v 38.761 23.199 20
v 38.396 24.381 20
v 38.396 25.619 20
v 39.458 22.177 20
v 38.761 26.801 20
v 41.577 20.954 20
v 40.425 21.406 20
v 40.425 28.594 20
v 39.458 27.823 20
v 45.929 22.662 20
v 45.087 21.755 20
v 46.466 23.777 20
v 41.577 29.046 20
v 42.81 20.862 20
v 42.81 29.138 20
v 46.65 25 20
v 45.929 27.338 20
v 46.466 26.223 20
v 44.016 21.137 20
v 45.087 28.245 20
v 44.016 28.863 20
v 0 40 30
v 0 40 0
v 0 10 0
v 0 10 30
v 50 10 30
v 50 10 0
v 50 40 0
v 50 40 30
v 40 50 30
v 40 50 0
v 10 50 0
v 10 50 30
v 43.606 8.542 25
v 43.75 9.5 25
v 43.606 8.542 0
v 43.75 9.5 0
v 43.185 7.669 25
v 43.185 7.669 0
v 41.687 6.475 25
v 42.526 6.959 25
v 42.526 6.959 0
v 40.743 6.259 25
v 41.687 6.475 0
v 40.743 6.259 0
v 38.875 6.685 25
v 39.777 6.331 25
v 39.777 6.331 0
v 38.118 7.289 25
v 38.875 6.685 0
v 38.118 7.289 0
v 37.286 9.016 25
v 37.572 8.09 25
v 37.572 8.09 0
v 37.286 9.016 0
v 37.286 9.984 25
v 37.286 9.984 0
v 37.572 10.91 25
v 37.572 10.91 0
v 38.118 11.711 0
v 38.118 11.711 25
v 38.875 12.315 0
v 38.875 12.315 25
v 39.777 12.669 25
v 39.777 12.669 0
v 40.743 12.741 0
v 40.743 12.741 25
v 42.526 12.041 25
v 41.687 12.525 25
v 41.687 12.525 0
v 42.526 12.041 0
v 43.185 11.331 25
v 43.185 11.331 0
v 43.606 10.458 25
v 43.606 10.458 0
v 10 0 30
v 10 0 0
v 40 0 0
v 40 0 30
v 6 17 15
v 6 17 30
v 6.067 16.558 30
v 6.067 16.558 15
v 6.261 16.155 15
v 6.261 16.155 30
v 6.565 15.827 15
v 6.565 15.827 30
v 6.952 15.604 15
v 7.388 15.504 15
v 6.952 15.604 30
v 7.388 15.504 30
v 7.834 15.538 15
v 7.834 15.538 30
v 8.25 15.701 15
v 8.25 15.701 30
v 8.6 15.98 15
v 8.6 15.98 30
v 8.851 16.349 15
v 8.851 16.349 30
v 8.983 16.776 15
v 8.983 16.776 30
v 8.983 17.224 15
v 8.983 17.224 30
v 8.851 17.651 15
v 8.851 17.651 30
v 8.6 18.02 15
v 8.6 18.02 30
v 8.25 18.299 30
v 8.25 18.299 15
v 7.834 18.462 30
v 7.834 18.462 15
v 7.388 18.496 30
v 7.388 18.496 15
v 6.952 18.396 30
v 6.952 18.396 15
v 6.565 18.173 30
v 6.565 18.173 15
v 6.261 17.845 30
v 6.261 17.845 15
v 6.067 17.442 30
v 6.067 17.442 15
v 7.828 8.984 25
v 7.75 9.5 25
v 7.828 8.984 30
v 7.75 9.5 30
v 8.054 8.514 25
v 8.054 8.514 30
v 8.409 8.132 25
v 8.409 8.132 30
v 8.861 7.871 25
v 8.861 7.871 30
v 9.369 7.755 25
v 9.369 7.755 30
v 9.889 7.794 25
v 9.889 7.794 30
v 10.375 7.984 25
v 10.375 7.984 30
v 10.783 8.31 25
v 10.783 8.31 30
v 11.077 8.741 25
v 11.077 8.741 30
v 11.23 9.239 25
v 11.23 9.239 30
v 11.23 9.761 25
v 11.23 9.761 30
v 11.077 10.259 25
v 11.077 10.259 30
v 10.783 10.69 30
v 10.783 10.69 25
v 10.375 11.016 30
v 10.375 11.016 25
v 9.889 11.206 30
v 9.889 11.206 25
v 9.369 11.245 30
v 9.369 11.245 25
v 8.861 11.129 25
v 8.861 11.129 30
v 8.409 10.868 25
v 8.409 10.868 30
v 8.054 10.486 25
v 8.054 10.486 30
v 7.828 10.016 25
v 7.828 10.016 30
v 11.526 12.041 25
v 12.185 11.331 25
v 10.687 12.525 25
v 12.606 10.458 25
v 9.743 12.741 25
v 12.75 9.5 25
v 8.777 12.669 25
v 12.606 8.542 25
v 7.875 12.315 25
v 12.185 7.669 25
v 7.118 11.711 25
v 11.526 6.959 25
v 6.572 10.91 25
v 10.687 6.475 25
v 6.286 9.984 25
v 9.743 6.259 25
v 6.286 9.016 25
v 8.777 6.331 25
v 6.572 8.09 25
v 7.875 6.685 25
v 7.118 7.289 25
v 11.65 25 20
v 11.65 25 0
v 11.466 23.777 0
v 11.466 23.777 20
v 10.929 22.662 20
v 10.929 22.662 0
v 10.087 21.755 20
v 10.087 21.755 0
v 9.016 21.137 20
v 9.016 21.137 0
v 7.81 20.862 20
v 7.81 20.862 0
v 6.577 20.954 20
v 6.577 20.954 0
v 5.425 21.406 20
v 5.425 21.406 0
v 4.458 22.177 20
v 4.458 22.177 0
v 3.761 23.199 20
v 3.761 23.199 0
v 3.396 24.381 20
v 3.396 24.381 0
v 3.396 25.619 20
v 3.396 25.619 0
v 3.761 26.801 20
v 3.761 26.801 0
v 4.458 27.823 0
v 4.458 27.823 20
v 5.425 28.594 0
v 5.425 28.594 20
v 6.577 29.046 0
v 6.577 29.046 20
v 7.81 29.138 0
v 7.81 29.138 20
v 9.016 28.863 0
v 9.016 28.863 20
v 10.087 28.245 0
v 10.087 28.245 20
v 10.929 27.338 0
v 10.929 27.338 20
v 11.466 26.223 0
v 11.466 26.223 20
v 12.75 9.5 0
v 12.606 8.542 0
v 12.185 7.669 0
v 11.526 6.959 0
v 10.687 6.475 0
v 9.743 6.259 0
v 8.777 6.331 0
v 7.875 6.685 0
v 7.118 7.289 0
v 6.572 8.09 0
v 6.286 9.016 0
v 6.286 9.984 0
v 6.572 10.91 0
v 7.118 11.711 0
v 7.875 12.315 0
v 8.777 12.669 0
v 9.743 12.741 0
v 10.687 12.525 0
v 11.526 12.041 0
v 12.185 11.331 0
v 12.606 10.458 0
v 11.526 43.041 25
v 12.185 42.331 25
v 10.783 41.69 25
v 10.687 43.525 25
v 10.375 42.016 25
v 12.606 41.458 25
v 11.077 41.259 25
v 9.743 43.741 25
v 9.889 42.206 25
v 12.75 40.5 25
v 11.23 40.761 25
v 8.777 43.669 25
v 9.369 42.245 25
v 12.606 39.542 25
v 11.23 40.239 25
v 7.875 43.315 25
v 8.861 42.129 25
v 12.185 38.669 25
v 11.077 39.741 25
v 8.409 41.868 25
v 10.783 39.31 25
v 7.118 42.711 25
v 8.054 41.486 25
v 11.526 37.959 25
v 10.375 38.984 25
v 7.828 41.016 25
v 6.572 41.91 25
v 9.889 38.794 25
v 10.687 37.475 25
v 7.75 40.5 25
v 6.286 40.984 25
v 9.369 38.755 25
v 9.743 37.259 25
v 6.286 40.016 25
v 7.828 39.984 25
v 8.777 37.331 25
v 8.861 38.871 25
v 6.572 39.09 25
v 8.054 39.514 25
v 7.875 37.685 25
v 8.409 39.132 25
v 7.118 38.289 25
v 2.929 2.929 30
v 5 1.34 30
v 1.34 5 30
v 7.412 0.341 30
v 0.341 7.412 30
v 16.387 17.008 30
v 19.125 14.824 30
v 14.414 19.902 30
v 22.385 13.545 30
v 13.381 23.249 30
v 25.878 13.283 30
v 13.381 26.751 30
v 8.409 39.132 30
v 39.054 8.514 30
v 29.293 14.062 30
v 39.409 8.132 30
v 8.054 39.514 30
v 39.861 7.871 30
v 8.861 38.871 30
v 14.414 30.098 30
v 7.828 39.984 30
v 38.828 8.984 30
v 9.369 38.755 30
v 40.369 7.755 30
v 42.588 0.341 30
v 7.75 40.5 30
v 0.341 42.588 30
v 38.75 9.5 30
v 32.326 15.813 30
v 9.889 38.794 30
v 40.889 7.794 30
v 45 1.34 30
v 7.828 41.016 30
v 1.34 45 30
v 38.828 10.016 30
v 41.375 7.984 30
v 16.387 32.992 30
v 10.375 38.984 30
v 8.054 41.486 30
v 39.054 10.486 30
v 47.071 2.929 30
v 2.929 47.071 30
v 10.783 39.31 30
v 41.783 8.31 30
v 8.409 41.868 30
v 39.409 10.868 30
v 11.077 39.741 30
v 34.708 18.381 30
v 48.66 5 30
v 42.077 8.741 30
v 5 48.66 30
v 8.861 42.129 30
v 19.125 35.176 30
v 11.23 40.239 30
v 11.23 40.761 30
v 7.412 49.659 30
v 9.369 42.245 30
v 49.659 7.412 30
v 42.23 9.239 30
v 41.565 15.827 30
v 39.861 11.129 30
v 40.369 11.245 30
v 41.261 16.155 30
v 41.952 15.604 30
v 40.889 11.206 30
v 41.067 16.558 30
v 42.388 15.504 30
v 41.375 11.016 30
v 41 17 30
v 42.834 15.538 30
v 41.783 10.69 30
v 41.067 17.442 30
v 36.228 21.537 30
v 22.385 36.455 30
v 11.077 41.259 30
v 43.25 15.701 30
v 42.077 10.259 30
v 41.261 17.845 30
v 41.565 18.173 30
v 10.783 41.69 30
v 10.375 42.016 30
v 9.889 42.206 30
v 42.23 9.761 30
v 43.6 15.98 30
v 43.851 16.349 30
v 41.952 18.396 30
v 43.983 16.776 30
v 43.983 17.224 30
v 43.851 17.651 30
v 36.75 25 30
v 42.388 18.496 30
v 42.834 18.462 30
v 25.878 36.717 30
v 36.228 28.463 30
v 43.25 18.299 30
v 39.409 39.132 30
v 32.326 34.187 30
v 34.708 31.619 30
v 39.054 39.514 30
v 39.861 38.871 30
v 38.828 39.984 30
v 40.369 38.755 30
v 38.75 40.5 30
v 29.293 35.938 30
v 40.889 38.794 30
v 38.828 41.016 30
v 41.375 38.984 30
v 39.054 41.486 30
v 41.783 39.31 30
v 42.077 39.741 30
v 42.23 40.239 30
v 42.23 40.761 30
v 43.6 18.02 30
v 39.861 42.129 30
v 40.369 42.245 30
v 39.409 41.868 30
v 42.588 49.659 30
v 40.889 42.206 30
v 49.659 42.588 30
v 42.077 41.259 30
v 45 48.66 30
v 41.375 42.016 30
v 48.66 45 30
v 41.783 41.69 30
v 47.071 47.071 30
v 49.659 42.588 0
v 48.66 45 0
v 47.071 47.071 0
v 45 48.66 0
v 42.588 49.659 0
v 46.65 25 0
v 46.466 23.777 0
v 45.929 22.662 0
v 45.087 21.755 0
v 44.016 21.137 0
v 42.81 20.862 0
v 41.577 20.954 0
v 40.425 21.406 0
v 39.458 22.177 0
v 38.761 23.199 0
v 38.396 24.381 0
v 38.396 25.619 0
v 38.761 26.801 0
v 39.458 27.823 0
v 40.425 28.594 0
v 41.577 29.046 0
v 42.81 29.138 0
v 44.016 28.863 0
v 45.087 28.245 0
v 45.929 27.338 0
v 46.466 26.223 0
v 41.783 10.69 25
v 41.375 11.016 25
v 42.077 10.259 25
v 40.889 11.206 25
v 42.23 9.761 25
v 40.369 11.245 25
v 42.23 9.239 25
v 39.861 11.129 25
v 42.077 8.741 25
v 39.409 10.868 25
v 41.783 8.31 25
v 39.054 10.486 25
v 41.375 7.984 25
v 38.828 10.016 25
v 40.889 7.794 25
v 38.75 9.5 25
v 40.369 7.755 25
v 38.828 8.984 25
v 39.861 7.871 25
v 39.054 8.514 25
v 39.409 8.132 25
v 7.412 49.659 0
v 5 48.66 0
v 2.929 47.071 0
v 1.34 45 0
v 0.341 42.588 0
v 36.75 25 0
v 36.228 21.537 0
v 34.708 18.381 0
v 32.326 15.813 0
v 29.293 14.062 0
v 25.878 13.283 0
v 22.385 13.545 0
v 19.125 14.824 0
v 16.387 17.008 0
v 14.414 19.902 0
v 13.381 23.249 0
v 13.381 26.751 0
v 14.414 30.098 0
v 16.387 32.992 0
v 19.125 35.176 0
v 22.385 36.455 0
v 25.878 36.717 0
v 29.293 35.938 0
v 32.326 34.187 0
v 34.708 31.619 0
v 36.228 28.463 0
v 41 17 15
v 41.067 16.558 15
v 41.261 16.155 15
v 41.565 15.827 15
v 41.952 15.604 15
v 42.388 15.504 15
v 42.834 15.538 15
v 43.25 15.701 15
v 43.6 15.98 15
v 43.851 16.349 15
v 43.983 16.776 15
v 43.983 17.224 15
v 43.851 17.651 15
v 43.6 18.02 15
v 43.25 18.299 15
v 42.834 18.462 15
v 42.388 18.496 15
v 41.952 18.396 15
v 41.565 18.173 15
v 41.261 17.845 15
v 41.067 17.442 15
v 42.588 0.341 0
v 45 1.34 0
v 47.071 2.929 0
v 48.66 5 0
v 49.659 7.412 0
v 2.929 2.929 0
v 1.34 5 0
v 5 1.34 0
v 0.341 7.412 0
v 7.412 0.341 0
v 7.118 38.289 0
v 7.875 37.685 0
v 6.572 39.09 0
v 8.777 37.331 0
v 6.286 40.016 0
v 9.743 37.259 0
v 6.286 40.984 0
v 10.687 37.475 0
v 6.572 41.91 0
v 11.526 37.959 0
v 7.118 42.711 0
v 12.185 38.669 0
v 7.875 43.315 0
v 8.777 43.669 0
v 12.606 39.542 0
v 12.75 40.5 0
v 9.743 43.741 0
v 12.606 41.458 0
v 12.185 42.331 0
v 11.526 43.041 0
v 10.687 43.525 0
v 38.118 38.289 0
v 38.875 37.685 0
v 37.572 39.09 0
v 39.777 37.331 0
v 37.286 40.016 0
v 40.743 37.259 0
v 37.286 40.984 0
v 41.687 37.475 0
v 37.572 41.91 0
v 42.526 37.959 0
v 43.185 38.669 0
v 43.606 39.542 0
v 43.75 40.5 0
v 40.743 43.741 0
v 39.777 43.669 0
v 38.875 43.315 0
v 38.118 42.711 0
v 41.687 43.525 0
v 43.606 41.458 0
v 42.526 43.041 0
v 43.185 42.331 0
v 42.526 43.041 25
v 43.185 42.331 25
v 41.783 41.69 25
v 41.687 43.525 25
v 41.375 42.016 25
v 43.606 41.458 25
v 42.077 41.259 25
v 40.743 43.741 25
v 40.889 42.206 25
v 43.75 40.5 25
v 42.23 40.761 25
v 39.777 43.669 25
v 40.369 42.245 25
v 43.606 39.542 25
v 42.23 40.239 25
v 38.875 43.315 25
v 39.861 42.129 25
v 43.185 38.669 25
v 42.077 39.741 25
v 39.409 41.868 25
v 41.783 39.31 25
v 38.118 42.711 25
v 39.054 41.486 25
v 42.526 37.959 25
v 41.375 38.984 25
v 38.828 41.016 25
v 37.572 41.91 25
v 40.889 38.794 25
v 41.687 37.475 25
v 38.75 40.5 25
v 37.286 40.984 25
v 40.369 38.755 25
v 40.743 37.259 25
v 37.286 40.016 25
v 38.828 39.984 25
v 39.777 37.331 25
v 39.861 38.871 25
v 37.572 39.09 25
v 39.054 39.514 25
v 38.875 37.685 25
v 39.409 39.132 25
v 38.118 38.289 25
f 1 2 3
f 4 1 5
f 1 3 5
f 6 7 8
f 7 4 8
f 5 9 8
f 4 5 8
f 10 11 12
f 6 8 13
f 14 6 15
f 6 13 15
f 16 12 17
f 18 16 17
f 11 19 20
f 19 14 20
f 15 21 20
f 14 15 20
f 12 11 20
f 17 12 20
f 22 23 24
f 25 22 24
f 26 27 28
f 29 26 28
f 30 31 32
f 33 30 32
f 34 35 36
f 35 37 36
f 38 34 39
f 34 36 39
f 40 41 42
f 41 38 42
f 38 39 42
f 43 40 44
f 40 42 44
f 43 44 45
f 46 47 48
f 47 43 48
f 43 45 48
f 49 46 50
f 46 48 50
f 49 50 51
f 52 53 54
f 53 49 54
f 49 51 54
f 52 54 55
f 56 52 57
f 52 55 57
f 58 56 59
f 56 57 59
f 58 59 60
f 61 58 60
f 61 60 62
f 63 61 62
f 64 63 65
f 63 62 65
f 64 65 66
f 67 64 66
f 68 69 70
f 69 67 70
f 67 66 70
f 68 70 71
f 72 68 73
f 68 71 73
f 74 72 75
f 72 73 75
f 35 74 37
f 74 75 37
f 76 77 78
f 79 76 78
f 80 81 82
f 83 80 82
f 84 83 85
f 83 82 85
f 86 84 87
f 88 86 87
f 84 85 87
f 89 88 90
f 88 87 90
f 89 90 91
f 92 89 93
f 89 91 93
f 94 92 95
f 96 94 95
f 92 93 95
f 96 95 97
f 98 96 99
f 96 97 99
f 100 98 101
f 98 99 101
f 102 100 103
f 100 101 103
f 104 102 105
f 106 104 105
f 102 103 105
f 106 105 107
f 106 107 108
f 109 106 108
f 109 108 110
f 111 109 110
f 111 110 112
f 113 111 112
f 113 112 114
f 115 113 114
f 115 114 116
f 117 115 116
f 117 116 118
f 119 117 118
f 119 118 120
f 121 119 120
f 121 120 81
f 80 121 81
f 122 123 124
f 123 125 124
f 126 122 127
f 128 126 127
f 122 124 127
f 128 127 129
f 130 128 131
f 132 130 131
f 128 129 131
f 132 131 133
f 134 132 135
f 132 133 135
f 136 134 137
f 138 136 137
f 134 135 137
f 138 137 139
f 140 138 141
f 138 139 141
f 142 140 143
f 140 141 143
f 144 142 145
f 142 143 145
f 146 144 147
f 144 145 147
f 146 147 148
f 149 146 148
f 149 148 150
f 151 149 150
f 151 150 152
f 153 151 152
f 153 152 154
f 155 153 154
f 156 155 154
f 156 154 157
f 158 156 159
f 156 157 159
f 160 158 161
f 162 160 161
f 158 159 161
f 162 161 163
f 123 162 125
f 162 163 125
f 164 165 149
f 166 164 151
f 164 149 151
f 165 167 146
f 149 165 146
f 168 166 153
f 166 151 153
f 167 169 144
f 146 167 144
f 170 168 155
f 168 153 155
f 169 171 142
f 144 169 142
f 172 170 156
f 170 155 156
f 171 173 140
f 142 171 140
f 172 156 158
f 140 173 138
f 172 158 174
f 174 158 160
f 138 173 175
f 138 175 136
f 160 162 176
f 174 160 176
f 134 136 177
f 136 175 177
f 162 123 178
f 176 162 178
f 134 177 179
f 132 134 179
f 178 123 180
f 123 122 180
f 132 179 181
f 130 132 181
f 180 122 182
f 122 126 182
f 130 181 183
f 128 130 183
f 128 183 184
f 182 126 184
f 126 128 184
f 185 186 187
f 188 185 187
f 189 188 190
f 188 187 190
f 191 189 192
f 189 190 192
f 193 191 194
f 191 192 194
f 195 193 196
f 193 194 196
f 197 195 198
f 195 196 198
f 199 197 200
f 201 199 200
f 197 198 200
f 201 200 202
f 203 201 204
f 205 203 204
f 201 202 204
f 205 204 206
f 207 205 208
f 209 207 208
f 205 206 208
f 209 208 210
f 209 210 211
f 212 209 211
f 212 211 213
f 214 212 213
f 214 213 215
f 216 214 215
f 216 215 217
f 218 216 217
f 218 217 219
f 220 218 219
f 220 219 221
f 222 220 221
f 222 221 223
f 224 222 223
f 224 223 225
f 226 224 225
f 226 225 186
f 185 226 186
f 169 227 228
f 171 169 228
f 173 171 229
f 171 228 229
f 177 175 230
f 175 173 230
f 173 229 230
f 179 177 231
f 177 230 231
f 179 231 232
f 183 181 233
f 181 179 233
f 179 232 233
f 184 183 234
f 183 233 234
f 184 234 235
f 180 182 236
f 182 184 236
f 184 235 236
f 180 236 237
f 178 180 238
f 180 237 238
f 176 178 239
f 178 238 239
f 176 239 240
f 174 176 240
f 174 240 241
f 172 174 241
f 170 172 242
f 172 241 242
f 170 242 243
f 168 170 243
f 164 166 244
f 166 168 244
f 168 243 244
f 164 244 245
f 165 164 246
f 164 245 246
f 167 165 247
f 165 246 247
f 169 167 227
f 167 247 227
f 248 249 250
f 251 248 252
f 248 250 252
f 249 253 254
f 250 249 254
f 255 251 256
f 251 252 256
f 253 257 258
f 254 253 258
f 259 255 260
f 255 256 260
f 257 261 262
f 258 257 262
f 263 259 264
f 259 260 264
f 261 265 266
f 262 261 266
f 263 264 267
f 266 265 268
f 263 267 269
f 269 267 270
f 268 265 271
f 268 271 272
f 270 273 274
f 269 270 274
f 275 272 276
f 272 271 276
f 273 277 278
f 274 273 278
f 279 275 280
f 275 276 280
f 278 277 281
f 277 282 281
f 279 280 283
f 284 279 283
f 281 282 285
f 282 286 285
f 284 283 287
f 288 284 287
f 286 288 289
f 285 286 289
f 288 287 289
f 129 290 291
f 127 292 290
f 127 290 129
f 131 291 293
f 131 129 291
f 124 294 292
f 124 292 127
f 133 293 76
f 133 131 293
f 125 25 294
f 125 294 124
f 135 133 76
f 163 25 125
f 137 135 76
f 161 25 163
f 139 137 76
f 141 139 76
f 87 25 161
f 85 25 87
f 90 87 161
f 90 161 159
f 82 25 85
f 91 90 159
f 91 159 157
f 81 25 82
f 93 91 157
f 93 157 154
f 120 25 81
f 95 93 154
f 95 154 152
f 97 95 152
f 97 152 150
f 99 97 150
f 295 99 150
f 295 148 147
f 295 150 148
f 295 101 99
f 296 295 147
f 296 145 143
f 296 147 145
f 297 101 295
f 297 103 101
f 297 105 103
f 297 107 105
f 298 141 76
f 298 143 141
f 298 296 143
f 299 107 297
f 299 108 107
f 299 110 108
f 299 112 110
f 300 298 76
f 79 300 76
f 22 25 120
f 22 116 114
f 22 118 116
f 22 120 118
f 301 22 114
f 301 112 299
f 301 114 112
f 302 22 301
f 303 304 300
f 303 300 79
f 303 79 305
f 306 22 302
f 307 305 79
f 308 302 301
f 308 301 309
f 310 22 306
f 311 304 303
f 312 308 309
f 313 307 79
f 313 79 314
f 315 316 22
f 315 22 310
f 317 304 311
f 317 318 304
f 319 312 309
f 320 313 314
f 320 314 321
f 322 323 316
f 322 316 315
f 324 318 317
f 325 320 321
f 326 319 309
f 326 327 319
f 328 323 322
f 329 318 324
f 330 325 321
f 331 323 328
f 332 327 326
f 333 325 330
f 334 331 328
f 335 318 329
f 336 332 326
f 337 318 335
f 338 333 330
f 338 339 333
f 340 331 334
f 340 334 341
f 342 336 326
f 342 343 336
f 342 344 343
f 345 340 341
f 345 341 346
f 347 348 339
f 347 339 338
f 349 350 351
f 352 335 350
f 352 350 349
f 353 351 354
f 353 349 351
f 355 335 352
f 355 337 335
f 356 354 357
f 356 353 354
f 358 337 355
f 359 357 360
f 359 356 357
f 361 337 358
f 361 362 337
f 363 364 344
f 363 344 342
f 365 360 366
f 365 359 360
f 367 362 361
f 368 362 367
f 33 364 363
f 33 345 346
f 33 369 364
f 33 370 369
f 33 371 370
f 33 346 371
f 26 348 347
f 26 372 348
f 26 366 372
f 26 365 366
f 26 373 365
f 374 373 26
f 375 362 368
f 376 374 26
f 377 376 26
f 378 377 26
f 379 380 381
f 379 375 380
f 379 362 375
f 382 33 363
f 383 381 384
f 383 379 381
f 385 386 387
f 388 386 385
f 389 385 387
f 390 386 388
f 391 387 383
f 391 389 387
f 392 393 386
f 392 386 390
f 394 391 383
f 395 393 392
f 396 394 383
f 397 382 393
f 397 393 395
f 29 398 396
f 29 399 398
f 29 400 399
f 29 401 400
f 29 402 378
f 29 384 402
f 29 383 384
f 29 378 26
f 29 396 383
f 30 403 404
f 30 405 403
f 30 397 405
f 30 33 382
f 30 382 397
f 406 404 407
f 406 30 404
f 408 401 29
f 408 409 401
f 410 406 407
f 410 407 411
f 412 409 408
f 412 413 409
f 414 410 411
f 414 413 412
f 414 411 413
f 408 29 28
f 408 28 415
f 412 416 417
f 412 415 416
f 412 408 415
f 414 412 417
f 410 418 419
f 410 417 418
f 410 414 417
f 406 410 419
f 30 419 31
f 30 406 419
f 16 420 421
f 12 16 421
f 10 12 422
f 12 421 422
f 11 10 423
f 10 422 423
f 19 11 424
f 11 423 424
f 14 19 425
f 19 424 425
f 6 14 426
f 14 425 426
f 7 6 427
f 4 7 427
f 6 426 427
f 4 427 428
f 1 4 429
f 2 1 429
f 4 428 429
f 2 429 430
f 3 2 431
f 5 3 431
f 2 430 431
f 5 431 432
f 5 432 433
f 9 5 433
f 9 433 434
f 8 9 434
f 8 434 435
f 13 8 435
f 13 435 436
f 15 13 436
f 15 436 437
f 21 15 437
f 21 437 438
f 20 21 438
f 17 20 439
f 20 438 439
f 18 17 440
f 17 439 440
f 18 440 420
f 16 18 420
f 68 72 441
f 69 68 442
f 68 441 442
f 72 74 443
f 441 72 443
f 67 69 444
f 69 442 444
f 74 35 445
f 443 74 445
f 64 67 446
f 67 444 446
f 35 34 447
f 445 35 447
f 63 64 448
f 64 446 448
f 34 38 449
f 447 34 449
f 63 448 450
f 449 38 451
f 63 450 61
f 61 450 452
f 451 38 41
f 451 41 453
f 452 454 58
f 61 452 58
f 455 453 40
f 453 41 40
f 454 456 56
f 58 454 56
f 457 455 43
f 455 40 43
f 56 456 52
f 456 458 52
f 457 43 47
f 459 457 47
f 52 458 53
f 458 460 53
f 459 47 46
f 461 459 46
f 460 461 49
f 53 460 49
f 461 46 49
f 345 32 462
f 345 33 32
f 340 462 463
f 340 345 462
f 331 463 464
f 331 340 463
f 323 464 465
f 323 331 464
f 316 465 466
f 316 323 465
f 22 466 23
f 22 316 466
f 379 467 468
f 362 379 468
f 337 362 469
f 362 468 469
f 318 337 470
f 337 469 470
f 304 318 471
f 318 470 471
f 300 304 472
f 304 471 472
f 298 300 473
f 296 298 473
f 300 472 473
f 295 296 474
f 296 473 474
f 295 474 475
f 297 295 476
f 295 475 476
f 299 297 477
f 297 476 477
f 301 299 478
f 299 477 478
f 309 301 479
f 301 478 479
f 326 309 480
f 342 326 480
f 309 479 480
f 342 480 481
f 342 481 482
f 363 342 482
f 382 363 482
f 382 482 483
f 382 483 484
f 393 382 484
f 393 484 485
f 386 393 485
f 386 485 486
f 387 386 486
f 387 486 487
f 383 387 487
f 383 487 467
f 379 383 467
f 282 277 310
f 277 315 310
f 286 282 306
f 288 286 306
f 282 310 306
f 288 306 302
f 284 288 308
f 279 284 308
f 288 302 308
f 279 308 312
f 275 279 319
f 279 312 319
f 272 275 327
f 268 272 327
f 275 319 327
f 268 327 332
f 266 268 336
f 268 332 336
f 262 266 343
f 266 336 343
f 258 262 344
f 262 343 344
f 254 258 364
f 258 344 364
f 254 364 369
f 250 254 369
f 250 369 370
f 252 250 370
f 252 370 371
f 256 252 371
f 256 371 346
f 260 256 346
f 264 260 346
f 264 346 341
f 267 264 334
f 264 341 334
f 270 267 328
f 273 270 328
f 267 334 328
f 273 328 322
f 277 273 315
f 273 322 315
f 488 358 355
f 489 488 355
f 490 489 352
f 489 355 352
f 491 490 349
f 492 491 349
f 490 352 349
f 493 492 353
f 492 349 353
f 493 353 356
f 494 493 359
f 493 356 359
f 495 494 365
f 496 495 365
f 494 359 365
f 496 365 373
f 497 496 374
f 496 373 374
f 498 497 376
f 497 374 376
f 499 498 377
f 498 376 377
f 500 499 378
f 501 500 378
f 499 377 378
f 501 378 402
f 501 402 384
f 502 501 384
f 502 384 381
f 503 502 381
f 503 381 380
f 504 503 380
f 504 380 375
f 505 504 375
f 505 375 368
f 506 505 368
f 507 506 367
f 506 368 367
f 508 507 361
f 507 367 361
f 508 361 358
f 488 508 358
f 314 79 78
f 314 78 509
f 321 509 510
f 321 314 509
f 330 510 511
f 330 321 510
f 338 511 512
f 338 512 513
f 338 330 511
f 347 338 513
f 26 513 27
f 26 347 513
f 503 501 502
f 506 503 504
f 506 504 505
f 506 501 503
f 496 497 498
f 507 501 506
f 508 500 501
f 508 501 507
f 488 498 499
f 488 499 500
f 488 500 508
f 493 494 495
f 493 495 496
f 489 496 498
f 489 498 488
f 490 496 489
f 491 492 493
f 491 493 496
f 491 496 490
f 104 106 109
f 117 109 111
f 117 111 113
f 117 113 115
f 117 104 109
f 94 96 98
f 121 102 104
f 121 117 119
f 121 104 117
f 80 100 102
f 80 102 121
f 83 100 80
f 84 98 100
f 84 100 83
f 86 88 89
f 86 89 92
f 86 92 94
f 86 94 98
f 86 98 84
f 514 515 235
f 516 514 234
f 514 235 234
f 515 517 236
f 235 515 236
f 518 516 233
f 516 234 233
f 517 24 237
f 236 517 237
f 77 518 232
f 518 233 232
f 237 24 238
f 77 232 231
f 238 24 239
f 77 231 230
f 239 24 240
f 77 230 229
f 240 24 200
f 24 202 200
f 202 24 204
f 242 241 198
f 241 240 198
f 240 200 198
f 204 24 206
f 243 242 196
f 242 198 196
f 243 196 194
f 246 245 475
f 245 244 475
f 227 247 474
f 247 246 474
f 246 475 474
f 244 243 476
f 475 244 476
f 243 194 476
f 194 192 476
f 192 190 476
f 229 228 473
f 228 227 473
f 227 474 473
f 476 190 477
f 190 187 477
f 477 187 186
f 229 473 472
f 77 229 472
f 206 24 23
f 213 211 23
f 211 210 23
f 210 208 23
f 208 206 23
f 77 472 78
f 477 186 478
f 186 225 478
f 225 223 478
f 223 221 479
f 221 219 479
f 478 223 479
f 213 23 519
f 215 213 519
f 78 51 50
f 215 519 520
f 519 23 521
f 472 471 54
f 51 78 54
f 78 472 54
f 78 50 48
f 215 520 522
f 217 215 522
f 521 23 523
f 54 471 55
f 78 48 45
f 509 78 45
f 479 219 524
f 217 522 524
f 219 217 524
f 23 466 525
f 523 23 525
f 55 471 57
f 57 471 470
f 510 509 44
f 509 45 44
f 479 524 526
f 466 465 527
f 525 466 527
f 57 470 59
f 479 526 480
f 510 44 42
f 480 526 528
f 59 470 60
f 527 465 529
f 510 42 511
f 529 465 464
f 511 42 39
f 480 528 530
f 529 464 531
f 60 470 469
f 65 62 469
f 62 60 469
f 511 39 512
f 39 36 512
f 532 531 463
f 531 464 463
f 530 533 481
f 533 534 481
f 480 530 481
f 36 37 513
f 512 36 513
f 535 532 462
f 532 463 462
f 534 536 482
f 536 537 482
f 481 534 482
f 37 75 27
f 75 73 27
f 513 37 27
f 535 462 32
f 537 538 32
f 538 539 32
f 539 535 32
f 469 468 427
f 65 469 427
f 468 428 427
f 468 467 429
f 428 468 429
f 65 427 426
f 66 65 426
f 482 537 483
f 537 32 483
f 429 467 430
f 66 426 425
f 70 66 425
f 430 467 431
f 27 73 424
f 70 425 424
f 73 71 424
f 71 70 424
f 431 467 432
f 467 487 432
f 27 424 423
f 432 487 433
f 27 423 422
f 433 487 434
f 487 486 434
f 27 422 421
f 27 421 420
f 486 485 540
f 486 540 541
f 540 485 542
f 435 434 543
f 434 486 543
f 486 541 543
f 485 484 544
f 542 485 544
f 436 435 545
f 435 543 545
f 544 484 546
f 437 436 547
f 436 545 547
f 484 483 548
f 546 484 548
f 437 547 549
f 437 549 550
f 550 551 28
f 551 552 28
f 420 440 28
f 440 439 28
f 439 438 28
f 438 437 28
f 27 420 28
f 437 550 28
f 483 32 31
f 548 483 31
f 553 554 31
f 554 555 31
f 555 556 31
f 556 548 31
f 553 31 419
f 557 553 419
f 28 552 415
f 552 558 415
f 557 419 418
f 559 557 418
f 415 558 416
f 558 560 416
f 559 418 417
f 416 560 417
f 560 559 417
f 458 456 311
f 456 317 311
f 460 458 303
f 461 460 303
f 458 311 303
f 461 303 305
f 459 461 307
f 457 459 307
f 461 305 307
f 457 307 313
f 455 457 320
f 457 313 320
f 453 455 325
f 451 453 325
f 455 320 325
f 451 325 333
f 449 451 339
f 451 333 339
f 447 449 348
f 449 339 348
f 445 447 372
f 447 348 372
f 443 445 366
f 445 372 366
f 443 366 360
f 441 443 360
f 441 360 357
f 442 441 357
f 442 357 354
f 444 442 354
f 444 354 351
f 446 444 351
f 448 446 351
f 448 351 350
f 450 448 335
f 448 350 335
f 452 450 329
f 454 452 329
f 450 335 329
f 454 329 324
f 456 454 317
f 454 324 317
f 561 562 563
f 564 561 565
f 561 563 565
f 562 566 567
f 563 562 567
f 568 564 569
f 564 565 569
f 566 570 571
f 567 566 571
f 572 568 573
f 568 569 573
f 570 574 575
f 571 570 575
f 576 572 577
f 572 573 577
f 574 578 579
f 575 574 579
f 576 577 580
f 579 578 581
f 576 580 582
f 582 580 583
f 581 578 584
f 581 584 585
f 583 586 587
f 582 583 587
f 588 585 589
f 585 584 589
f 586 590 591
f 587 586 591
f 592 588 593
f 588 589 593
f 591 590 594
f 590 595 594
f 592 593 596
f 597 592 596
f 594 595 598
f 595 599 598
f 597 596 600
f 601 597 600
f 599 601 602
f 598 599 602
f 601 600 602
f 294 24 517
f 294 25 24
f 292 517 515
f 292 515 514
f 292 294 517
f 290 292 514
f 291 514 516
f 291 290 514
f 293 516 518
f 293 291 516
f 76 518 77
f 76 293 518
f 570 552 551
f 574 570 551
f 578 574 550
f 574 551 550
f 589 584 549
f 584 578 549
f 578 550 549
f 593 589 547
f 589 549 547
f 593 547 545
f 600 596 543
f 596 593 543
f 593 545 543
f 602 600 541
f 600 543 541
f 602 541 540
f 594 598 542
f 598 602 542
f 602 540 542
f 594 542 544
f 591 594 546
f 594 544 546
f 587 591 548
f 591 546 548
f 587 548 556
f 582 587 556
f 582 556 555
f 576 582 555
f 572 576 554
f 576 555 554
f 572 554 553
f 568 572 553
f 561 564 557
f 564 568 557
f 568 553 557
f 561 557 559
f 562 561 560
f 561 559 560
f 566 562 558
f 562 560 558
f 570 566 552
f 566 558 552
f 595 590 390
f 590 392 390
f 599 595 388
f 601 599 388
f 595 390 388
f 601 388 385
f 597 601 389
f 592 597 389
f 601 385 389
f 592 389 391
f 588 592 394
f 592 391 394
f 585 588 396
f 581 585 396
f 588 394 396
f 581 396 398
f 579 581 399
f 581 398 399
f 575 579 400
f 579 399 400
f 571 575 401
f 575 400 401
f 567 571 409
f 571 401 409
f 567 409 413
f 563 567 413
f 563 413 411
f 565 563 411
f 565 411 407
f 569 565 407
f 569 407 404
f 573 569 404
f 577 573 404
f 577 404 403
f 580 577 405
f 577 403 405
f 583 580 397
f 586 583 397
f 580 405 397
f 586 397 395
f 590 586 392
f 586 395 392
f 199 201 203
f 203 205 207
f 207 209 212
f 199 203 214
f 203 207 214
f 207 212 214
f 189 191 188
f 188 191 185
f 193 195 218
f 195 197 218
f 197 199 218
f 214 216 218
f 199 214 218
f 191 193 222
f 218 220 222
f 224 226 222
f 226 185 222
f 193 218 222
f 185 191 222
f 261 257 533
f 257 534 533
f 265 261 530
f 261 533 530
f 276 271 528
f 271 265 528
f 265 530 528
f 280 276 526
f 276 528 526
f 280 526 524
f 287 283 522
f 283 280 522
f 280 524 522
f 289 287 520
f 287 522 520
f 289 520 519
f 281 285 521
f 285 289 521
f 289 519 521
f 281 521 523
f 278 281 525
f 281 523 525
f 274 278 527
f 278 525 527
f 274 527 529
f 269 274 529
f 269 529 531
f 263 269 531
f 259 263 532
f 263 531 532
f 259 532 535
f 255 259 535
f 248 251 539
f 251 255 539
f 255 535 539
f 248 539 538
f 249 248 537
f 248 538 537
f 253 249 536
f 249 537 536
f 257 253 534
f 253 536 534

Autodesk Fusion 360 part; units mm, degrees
sketch "Skizze1" plane through (0, 0, 0) normal (0, 0, 1) x (1, 0, 0)
  line L0 (0, 0) -> (50, 0)
  line L1 (50, 0) -> (50, 50)
  line L2 (50, 50) -> (0, 50)
  line L3 (0, 50) -> (0, 0)
  line L4 (25, 50) -> (25, -0.5033)
  circle A0 centre (25, 25) radius 11.75
  circle A1 centre (7.5, 17) radius 1.5
  circle A2 centre (42.5, 17) radius 1.5
  circle A3 centre (7.5, 25) radius 4.15
  circle A4 centre (42.5, 25) radius 4.15
  line L5 (9.5, 40.5) -> (40.5, 40.5)
  line L6 (40.5, 40.5) -> (40.5, 9.5)
  line L7 (40.5, 9.5) -> (9.5, 9.5)
  line L8 (9.5, 9.5) -> (9.5, 40.5)
  line L9 (0, 25) -> (50, 25)
  circle A5 centre (9.5, 40.5) radius 3.25
  circle A6 centre (40.5, 40.5) radius 3.25
  circle A7 centre (40.5, 9.5) radius 3.25
  circle A8 centre (9.5, 9.5) radius 3.25
  dimension "d1" = 50
  dimension "d2" = 50
  dimension "d3" = 23.5
  dimension "d4" = 3
  dimension "d5" = 3
  dimension "d6" = 35
  dimension "d7" = 17.5
  dimension "d8" = 8
  dimension "d9" = 8
  dimension "d10" = 25
  dimension "d11" = 8.3
  dimension "d12" = 8.3
  dimension "d13" = 25
  dimension "d14" = 25
  dimension "d15" = 17.5
  dimension "d16" = 17.5
  dimension "d29" = 31
  dimension "d30" = 31
  dimension "d31" = 15.5
  dimension "d32" = 15.5
  dimension "d33" = 6.5
extrude "Extrusion1" add sketch "Skizze1" along normal blind 30 contours L0 L3 L4 A3 L7 L8 L9 A8 | L0 L1 L4 A4 L6 L7 L9 A7 | L2 L3 L4 A3 L5 L8 L9 A5 | L4 A0 A3 L7 L8 L9 A8 | L4 A0 A4 L6 L7 L9 A7 | A3 L8 L9 | A3 L8 L9 | L1 L2 L4 A4 L5 L6 L9 A6 | L4 A0 A3 L5 L8 L9 A5 | A3 L8 L9 | A3 L8 L9 | A4 L6 L9 | A4 L6 L9 | L4 A0 A4 L5 L6 L9 A6 | A4 L6 L9 | A4 L6 L9 | A1 | A2
extrude "Extrusion2" cut sketch "Skizze1" along normal blind 20 contours A3 L8 L9 | A3 L8 L9 | A3 L8 L9 | A3 L8 L9 | A4 L6 L9 | A4 L6 L9 | A4 L6 L9 | A4 L6 L9
sketch "Skizze2" plane through (0, 0, 30) normal (0, 0, 1) x (-1, 0, 0)
  circle A0 centre (-25, -25) radius 11.75
  line L0 (0, -50) -> (0, 0)
  line L1 (0, 0) -> (-50, 0)
  line L2 (-50, 0) -> (-50, -50)
  line L3 (-50, -50) -> (0, -50)
  circle A1 centre (-7.5, -17) radius 1.5
  circle A2 centre (-42.5, -17) radius 1.5
  circle A3 centre (-40.5, -40.5) radius 3.25
  circle A4 centre (-9.5, -9.5) radius 3.25
  circle A5 centre (-40.5, -9.5) radius 3.25
  circle A6 centre (-9.5, -40.5) radius 3.25
  circle A7 centre (-9.5, -40.5) radius 3.25
  circle A8 centre (-40.5, -40.5) radius 3.25
  circle A9 centre (-40.5, -9.5) radius 3.25
  circle A10 centre (-9.5, -9.5) radius 3.25
  circle A11 centre (-9.5, -40.5) radius 1.75
  circle A12 centre (-40.5, -40.5) radius 1.75
  circle A13 centre (-40.5, -9.5) radius 1.75
  circle A14 centre (-9.5, -9.5) radius 1.75
  point P0 (-25, -25)
  dimension "d21" = 3
  dimension "d22" = 3
  dimension "d23" = 17.5
  dimension "d24" = 17.5
  dimension "d25" = 8
  dimension "d26" = 8
  dimension "d34" = 6.5
  dimension "d35" = 3.5
extrude "Extrusion3" cut sketch "Skizze2" against normal blind 15 contours A1 | A2
extrude "Extrusion4" add sketch "Skizze2" against normal blind 5 contours A3 A8 | A4 A10 | A5 A9 | A6 A7
fillet "Abrundung1" radius 10 4 edges at (50, 50, 15) (50, 0, 15) (0, 0, 15) (0, 50, 15)
equation "d7 = ( 35 / 2 ) * 1 mm"
equation "d31 = ( 31 / 2 ) * 1 mm"
equation "d32 = ( 31 / 2 ) * 1 mm"
